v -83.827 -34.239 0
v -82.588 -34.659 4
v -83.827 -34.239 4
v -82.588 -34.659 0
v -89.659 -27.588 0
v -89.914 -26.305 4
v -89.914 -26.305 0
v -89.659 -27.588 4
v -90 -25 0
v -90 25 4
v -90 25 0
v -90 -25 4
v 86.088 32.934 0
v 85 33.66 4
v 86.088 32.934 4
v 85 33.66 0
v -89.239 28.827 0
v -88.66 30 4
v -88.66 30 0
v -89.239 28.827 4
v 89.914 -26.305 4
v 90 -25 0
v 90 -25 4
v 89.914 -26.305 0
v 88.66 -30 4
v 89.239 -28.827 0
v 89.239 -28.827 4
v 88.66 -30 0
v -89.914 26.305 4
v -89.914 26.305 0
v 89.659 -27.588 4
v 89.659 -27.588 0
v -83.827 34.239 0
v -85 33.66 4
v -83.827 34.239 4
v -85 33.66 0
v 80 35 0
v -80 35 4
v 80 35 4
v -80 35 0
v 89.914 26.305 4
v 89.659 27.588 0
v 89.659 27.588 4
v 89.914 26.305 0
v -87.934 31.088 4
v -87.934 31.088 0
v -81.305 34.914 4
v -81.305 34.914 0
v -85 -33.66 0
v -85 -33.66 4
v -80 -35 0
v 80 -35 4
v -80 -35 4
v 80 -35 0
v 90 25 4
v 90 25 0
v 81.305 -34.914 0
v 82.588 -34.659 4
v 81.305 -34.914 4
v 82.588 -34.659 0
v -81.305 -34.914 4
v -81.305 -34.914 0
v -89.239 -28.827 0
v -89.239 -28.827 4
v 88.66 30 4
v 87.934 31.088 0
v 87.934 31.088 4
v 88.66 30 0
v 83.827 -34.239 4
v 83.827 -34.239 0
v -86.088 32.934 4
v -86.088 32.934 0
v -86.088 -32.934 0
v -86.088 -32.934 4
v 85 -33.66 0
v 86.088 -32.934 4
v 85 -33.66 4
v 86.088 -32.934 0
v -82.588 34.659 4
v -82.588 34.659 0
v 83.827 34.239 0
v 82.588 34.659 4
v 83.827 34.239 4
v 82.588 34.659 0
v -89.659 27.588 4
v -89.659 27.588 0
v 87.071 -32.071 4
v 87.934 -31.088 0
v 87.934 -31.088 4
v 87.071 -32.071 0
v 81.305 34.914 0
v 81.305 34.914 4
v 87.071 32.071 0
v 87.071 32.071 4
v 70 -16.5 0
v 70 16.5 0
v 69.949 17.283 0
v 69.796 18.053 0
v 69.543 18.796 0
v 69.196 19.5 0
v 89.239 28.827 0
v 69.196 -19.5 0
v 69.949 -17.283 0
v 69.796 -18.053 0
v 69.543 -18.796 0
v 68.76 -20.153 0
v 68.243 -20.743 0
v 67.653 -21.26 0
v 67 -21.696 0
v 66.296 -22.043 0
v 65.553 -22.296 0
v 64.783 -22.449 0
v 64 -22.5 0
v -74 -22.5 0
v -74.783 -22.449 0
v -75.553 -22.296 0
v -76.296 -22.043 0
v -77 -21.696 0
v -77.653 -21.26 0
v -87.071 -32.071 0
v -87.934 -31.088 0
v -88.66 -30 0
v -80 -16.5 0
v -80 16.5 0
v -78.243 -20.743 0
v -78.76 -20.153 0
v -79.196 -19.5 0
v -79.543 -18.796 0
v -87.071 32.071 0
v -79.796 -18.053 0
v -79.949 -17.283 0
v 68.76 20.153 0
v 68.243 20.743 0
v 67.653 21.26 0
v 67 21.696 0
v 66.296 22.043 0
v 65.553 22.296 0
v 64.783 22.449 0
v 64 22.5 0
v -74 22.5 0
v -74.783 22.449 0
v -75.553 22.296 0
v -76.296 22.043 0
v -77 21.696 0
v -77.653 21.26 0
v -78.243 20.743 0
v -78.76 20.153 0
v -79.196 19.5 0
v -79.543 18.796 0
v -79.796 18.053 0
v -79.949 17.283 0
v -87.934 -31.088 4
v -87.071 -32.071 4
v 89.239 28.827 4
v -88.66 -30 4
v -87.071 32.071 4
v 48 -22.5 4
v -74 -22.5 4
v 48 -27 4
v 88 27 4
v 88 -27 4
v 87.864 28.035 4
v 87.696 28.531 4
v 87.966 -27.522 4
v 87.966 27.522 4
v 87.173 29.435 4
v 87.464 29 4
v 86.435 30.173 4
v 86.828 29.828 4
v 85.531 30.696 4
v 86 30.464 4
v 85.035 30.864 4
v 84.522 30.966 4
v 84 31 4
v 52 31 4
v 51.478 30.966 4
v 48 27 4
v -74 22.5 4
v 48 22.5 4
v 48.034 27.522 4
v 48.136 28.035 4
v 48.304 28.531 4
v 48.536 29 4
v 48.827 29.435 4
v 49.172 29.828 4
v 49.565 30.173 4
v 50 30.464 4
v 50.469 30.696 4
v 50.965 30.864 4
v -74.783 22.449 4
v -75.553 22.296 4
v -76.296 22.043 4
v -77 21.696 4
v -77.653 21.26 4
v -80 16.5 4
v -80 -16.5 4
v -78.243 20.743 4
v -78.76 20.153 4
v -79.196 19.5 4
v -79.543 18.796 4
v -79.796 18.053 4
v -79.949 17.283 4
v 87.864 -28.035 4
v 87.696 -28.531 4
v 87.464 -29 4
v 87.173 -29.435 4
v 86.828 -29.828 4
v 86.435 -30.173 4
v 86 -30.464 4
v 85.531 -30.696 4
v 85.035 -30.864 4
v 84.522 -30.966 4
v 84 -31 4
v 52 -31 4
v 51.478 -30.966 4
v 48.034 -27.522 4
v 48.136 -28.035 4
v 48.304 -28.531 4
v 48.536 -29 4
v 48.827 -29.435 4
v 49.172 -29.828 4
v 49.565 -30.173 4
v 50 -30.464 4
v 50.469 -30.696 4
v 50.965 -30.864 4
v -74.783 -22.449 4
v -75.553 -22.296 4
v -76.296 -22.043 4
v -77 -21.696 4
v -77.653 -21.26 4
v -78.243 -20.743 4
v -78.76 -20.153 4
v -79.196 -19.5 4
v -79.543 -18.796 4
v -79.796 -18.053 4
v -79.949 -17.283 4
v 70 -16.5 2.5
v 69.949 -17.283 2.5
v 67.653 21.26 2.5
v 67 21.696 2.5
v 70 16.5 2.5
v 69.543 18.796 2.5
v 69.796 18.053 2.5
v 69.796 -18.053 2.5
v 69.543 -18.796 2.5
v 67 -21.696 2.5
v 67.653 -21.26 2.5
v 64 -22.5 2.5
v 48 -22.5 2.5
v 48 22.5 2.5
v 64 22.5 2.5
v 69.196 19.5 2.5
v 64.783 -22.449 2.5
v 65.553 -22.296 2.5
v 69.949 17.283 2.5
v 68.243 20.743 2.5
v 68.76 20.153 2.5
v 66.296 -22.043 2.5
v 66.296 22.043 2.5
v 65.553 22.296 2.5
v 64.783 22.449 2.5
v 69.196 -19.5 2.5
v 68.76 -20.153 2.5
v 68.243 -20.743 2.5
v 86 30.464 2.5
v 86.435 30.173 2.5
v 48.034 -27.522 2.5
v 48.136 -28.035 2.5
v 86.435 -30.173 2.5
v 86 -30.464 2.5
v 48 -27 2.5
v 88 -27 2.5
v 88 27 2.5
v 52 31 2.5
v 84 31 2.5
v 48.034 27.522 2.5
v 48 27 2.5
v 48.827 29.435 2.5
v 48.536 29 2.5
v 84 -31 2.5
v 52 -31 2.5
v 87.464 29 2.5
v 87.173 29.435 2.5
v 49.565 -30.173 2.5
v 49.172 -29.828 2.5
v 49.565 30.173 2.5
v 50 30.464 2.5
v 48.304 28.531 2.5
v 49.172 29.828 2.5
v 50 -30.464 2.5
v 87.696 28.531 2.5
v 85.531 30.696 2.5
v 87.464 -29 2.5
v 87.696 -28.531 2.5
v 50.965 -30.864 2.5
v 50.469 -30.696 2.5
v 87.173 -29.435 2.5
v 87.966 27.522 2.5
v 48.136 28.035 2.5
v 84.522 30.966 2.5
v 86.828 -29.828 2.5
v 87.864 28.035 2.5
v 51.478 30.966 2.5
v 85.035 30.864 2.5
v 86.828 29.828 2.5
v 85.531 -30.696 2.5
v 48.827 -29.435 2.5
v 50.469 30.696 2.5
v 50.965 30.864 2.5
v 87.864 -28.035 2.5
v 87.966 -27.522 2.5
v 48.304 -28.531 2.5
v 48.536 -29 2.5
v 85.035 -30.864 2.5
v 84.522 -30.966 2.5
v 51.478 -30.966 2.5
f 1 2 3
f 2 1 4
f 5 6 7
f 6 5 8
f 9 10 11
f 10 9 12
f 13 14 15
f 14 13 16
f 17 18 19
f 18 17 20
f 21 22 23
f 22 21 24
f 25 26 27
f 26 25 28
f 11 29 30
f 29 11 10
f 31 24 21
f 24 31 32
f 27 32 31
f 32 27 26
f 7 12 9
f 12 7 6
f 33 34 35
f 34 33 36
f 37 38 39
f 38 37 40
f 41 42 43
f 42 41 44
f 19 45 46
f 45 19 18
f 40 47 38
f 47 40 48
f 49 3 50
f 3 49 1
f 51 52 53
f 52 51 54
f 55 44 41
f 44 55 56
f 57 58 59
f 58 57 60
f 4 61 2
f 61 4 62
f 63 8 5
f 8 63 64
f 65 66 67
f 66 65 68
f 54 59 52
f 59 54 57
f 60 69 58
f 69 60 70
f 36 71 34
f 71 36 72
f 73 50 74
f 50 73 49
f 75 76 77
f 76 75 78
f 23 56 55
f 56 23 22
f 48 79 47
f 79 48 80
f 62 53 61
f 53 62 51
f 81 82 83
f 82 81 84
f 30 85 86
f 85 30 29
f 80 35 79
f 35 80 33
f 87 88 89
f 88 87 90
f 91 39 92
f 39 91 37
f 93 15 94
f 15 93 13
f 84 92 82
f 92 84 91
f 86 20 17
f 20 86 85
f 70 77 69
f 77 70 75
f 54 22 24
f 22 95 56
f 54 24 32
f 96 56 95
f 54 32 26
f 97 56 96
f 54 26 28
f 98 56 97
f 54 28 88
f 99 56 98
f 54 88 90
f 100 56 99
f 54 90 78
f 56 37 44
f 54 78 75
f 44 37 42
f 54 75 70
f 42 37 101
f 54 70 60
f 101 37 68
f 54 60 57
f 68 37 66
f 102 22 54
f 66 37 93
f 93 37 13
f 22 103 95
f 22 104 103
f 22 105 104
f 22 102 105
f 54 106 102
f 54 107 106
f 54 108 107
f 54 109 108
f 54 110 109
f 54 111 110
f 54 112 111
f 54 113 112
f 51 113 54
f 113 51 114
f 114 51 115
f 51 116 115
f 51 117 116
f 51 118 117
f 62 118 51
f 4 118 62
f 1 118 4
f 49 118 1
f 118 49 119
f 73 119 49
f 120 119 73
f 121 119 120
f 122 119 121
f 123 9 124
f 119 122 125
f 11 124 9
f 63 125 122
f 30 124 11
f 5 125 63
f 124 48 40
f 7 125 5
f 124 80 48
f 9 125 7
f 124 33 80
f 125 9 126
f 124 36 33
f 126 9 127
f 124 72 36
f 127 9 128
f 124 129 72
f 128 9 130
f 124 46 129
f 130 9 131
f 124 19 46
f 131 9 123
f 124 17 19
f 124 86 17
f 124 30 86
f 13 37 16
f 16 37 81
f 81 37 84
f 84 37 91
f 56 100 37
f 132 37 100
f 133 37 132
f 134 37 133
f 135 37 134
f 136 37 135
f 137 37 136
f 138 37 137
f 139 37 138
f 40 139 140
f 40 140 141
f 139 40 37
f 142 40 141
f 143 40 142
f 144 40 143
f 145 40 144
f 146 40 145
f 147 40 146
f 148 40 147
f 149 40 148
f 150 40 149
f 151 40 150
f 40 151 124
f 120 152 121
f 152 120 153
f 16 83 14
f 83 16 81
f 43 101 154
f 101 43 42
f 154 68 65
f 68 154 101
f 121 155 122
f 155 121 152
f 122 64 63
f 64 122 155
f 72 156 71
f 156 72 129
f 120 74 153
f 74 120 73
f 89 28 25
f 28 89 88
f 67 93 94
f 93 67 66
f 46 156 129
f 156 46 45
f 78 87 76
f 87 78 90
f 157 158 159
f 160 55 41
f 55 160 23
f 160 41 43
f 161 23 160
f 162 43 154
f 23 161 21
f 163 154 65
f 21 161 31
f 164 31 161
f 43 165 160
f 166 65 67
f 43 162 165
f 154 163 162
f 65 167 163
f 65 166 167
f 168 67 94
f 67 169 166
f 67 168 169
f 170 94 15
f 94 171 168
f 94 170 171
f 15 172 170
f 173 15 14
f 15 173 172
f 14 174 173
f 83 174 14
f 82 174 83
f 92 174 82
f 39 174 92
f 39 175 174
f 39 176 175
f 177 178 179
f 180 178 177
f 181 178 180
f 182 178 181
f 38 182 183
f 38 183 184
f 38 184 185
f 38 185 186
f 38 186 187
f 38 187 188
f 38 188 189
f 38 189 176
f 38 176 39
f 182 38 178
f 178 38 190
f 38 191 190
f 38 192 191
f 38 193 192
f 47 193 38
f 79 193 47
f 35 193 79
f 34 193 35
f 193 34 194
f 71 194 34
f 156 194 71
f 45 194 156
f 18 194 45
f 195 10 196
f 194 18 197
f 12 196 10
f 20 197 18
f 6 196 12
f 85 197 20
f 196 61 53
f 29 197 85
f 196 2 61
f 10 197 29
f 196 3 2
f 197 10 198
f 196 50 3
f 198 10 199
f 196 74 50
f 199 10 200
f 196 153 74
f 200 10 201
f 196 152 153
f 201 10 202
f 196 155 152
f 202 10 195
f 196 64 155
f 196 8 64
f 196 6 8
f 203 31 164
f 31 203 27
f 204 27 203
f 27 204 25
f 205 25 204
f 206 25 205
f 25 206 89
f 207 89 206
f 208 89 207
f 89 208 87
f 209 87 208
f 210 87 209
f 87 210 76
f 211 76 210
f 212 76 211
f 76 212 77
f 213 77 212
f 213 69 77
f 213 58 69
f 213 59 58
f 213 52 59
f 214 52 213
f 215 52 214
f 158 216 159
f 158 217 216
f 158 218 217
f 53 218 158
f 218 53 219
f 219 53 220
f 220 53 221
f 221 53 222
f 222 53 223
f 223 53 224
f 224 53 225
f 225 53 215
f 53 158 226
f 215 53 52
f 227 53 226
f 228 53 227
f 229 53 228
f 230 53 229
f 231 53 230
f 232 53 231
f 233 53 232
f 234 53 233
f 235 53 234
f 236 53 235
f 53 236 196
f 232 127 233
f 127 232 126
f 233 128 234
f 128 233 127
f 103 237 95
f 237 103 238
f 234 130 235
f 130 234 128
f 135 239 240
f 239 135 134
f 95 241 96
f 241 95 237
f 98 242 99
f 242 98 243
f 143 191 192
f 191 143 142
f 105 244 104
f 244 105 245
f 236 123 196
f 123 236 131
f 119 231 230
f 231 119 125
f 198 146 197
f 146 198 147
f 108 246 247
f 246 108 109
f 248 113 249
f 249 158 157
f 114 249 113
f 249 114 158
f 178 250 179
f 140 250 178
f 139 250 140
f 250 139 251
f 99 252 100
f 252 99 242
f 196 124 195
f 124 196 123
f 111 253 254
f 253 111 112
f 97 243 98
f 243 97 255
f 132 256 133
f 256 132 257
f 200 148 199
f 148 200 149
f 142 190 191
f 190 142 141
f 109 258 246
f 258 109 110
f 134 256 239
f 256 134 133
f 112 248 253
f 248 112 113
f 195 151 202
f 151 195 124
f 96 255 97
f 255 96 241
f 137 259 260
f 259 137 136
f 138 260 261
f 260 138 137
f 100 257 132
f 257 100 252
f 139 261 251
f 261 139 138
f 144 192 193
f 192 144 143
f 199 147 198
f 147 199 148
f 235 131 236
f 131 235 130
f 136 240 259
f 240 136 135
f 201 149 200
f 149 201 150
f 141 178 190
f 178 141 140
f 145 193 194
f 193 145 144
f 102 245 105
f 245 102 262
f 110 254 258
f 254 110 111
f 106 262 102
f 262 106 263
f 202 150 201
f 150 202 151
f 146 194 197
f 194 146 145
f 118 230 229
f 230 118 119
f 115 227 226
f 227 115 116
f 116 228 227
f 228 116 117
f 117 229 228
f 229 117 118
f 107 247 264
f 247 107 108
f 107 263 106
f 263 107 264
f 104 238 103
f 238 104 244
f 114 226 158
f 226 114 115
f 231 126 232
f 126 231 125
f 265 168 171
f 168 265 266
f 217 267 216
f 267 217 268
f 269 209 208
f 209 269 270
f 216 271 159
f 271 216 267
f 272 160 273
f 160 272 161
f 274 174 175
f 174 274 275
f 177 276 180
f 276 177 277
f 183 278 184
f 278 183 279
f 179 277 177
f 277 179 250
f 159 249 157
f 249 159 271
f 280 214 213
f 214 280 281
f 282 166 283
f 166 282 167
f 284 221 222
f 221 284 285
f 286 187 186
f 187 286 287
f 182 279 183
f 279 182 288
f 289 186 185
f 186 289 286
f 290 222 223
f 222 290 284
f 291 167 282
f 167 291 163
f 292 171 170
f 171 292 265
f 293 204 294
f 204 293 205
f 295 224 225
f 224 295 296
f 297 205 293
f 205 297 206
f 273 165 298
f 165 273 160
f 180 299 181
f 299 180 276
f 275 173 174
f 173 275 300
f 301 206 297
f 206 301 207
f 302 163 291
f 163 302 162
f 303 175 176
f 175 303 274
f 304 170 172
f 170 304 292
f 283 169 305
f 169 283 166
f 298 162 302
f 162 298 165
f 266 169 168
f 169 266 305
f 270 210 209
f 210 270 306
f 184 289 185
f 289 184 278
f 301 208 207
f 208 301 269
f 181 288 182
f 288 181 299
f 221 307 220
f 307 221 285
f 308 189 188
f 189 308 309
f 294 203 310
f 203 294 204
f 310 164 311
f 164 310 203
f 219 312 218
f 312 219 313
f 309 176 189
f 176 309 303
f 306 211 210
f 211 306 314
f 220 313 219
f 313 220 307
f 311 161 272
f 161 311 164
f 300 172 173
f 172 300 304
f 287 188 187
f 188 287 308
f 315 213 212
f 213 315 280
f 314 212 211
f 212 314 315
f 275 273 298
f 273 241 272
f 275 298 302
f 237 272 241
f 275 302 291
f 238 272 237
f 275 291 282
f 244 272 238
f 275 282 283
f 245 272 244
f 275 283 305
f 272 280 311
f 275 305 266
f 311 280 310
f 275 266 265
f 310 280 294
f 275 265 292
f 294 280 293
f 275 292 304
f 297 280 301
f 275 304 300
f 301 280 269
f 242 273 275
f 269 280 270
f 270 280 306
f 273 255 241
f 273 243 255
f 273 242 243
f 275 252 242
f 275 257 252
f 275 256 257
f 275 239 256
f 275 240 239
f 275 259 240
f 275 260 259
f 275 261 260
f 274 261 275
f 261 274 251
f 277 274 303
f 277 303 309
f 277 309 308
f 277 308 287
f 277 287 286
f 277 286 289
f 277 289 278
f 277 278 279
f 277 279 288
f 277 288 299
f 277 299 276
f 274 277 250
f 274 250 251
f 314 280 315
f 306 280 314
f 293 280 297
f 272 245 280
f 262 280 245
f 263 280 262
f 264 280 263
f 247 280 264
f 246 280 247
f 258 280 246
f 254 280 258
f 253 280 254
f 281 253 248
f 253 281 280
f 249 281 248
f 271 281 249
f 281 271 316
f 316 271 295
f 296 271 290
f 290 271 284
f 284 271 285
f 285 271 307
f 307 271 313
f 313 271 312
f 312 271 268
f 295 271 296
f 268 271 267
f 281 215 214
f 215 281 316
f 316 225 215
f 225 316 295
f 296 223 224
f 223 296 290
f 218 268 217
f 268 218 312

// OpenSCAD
// Rear-light decorative TRIM / surround — with blank custom-design panel.
// Pleading Sanity / P.S Studio · 17 Nov 2026
// IMPORTANT — UK ROAD LEGALITY: this is a decorative SURROUND / bezel that sits
// AROUND the lit lens, or a clear lens protector. It must NOT cover the lit
// area, change its colour, or reduce visibility — that fails MOT and is illegal.
// The inner opening exposes the full lens. The blank panel sits on the
// non-lit housing section for your custom design (engrave or glue an insert).
// MEASURE the rear section of your rear light first and edit the numbers.
// MATERIAL: black PETG/ASA for trim; CLEAR PETG if making a lens protector.
// Fit-check a paper template first. 0.2mm, 3 walls, no supports.

$fn = 48;

// ---- MEASURE THE REAR SECTION OF YOUR REAR LIGHT AND EDIT THESE ----
outer_w   = 180;   // mm — total width of trim
outer_h   = 70;    // mm — total height of trim
inner_w   = 150;   // mm — width of lens opening (must expose FULL lit area)
inner_h   = 45;    // mm — height of lens opening
trim_t    = 4;     // mm — thickness (depth) of the bezel
corner_r  = 10;    // mm — outer corner radius
inner_r   = 6;     // mm — inner corner radius
panel_w   = 40;    // mm — width of blank custom-design panel (non-lit section)
panel_d   = 1.5;   // mm — recess depth for your design insert/engraving
// ---------------------------------------------------------------

module rounded_rect(w, h, r) {
  hull() {
    for (dx = [-w/2+r, w/2-r])
      for (dy = [-h/2+r, h/2-r])
        translate([dx, dy]) circle(r=r);
  }
}

difference() {
  // bezel body
  linear_extrude(trim_t)
  rounded_rect(outer_w, outer_h, corner_r);
  // lens opening — exposes the lit lens fully, shifted to leave panel on side
  translate([(outer_w-inner_w)/2 - panel_w/2, 0, -0.5])
  linear_extrude(trim_t+1)
  rounded_rect(inner_w, inner_h, inner_r);
  // blank custom-design panel recess (carved from top face, non-lit area)
  translate([outer_w/2 - panel_w/2 - 2, 0, trim_t - panel_d])
  linear_extrude(panel_d + 0.5)
  rounded_rect(panel_w, outer_h - 8, 4);
}

// Your design goes in the recess: engrave text/logo, or glue a printed insert.
// Print a paper template at 100% scale first, hold it to the light, confirm fit.
